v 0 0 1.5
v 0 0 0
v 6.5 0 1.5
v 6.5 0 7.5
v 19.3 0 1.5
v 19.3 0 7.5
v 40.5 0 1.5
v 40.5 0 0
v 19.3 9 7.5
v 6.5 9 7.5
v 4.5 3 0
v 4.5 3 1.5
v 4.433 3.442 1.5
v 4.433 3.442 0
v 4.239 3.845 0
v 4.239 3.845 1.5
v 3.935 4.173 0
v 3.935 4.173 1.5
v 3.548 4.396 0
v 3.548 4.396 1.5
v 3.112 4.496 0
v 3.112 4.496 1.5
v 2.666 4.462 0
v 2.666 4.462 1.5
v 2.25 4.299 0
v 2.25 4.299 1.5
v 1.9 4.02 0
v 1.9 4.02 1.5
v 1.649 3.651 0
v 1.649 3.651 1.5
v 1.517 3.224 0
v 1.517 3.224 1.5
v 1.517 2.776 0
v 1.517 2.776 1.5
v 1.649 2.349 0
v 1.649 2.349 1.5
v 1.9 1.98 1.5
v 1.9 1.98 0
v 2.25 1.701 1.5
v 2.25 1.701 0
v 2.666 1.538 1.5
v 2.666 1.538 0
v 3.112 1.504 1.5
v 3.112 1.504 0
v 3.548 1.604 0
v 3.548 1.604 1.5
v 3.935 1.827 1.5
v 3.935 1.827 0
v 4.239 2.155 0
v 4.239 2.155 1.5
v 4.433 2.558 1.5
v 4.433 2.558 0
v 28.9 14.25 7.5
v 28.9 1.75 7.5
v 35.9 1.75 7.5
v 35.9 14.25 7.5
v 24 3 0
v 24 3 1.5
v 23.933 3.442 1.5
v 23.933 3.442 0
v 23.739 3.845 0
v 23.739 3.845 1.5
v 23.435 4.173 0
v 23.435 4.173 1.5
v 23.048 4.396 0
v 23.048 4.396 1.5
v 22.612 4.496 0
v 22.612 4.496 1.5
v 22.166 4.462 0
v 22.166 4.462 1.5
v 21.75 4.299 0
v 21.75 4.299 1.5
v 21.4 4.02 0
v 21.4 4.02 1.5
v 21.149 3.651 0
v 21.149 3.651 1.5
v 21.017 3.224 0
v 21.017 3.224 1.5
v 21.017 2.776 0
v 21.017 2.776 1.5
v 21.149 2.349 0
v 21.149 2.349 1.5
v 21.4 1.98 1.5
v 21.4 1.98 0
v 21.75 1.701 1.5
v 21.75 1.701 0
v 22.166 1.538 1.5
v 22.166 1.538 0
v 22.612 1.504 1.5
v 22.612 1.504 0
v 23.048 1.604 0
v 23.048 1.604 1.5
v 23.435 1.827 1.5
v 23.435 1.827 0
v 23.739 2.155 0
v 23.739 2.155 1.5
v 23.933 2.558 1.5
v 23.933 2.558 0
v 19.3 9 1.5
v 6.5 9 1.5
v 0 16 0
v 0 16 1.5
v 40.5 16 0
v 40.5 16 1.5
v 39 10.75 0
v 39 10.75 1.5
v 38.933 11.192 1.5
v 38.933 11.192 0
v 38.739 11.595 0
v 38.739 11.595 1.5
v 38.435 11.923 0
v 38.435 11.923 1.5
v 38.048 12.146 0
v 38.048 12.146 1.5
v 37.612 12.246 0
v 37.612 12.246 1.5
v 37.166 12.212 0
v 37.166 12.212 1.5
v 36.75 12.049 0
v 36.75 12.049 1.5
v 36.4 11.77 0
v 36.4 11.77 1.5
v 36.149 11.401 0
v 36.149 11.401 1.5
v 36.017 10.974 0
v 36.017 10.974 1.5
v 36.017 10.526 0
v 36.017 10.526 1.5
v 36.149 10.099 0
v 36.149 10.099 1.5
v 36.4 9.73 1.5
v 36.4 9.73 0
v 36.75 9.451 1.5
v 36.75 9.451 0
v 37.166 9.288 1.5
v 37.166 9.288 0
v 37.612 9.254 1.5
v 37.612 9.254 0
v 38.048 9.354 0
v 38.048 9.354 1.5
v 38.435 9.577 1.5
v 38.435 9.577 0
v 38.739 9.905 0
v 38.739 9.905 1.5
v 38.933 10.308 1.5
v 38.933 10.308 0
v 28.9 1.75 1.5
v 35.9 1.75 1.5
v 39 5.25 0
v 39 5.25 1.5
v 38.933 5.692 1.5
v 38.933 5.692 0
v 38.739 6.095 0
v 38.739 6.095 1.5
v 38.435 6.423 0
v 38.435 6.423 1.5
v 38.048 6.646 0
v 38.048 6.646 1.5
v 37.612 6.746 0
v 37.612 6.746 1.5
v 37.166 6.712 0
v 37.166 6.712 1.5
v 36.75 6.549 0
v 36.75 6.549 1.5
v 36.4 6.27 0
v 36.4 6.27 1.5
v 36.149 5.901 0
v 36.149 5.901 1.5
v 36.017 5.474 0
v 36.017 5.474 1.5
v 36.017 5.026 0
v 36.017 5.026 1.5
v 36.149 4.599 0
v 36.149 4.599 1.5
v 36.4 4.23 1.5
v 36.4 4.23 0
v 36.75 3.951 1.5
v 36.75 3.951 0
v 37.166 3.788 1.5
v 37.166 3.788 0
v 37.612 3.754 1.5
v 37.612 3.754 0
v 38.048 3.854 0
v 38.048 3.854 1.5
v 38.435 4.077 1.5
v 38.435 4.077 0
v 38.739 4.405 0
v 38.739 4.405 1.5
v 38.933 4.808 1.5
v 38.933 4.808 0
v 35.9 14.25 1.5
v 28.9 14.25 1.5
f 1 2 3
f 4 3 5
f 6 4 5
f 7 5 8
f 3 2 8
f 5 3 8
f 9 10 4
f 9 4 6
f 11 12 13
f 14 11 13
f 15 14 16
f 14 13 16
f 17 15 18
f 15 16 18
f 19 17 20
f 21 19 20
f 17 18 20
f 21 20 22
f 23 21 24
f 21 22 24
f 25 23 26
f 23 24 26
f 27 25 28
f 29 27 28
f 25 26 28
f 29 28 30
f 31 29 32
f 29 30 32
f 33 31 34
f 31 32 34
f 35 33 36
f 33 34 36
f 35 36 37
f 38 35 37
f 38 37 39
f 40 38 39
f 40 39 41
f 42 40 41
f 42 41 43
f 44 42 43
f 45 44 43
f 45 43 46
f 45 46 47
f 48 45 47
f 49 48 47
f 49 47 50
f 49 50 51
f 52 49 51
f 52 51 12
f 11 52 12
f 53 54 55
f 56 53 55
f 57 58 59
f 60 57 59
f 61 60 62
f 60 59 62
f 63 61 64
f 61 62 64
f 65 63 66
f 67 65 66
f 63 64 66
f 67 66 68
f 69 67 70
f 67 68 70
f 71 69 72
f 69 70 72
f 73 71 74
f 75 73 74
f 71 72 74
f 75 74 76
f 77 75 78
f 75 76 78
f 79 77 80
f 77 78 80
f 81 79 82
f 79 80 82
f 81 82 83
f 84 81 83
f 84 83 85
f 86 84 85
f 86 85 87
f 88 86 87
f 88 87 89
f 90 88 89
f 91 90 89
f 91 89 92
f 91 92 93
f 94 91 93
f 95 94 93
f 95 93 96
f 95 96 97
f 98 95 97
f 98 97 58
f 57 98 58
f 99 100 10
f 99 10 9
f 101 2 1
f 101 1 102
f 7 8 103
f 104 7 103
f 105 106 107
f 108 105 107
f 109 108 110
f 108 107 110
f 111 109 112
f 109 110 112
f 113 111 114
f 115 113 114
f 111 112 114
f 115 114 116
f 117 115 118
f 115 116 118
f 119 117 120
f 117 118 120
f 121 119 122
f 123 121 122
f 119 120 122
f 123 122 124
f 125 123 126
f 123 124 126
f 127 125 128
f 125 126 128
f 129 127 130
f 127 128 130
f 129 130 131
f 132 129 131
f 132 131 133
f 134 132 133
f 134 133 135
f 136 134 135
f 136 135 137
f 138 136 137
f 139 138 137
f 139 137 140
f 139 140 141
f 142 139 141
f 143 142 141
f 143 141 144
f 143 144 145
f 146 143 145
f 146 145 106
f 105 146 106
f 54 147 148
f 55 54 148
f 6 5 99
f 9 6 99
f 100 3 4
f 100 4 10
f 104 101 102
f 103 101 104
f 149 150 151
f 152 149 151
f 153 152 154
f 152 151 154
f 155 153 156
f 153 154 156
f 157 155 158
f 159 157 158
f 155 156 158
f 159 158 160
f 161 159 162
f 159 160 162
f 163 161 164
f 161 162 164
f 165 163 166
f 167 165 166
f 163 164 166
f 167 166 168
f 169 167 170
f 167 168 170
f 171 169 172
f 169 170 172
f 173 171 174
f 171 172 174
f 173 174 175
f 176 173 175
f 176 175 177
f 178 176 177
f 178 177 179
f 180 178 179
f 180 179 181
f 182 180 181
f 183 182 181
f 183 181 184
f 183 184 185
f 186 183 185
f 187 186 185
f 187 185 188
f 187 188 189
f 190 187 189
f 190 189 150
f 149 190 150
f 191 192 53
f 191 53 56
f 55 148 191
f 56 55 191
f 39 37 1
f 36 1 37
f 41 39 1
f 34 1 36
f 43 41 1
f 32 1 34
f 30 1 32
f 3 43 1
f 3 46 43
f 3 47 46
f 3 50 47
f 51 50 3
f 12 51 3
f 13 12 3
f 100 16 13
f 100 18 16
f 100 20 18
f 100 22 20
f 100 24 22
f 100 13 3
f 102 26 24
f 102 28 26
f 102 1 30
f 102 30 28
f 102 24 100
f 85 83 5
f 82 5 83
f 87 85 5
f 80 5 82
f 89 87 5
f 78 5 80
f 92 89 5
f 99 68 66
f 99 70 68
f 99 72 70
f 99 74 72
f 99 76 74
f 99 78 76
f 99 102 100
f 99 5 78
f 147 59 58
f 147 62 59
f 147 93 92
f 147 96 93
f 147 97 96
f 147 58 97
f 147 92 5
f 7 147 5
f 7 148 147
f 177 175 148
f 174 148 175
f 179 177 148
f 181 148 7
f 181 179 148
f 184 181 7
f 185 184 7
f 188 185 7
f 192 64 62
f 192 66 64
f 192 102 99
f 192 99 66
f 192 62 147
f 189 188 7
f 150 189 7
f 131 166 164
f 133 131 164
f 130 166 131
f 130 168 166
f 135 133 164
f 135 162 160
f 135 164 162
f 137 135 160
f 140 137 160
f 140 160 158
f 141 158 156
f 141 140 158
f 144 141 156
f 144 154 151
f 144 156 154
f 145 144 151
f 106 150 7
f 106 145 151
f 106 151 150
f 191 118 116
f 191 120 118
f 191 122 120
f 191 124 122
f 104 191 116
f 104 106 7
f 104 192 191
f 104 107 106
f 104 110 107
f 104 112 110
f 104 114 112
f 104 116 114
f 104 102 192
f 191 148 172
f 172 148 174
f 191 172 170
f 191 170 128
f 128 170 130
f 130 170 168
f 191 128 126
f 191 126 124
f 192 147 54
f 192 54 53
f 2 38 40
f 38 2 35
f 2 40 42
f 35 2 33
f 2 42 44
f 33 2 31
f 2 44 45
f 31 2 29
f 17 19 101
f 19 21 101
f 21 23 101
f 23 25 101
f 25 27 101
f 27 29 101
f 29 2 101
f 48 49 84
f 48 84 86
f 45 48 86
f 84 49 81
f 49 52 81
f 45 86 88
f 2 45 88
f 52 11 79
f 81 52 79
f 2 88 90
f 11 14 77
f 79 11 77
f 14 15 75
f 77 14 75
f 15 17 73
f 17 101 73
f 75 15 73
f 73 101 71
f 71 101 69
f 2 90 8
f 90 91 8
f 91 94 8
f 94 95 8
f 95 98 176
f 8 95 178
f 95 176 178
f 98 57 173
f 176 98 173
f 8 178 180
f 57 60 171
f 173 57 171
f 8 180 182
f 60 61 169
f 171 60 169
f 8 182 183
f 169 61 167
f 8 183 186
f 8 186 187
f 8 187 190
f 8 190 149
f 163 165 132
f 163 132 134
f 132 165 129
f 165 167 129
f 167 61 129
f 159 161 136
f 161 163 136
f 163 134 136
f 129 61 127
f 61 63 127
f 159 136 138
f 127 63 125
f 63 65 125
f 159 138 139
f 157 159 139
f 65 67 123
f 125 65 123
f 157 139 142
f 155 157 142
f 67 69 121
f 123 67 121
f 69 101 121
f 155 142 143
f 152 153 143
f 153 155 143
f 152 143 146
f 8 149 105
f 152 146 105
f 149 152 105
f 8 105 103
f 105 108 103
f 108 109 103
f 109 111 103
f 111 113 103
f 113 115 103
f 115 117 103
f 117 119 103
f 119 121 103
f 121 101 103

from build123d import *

# Parameters (mm, degrees)
SKETCH027_W     = 40.5
SKETCH027_H     = 16
PAD017_DEPTH    = 1.5
SKETCH028_R     = 1.5
POCKET009_DEPTH = 1.501
SKETCH029_W     = 12.8
SKETCH029_H     = 9
SKETCH029_W_2   = 7
SKETCH029_H_2   = 12.5
PAD018_DEPTH    = 6


with BuildPart() as part:
    # Sketch027 → Pad017 (new body)
    with BuildSketch(Plane.XY):
        with Locations((20.25, 8)):
            Rectangle(SKETCH027_W, SKETCH027_H)
    extrude(amount=PAD017_DEPTH)

    # Sketch028 (on Face6 of Pad017) → Pocket009 (cut, through all)
    with BuildSketch(Plane.XY.offset(1.5)):
        with Locations((3, 3)):
            Circle(SKETCH028_R)
        with Locations((22.5, 3)):
            Circle(SKETCH028_R)
        with Locations((37.5, 10.75)):
            Circle(SKETCH028_R)
        with Locations((37.5, 5.25)):
            Circle(SKETCH028_R)
    extrude(amount=-POCKET009_DEPTH, mode=Mode.SUBTRACT)

    # Sketch029 (on Face5 of Pocket009) → Pad018 (join)
    with BuildSketch(Plane.XY.offset(1.5)):
        with Locations((12.9, 4.5)):
            Rectangle(SKETCH029_W, SKETCH029_H)
        with Locations((32.4, 8)):
            Rectangle(SKETCH029_W_2, SKETCH029_H_2)
    extrude(amount=PAD018_DEPTH)


solid = part.part
